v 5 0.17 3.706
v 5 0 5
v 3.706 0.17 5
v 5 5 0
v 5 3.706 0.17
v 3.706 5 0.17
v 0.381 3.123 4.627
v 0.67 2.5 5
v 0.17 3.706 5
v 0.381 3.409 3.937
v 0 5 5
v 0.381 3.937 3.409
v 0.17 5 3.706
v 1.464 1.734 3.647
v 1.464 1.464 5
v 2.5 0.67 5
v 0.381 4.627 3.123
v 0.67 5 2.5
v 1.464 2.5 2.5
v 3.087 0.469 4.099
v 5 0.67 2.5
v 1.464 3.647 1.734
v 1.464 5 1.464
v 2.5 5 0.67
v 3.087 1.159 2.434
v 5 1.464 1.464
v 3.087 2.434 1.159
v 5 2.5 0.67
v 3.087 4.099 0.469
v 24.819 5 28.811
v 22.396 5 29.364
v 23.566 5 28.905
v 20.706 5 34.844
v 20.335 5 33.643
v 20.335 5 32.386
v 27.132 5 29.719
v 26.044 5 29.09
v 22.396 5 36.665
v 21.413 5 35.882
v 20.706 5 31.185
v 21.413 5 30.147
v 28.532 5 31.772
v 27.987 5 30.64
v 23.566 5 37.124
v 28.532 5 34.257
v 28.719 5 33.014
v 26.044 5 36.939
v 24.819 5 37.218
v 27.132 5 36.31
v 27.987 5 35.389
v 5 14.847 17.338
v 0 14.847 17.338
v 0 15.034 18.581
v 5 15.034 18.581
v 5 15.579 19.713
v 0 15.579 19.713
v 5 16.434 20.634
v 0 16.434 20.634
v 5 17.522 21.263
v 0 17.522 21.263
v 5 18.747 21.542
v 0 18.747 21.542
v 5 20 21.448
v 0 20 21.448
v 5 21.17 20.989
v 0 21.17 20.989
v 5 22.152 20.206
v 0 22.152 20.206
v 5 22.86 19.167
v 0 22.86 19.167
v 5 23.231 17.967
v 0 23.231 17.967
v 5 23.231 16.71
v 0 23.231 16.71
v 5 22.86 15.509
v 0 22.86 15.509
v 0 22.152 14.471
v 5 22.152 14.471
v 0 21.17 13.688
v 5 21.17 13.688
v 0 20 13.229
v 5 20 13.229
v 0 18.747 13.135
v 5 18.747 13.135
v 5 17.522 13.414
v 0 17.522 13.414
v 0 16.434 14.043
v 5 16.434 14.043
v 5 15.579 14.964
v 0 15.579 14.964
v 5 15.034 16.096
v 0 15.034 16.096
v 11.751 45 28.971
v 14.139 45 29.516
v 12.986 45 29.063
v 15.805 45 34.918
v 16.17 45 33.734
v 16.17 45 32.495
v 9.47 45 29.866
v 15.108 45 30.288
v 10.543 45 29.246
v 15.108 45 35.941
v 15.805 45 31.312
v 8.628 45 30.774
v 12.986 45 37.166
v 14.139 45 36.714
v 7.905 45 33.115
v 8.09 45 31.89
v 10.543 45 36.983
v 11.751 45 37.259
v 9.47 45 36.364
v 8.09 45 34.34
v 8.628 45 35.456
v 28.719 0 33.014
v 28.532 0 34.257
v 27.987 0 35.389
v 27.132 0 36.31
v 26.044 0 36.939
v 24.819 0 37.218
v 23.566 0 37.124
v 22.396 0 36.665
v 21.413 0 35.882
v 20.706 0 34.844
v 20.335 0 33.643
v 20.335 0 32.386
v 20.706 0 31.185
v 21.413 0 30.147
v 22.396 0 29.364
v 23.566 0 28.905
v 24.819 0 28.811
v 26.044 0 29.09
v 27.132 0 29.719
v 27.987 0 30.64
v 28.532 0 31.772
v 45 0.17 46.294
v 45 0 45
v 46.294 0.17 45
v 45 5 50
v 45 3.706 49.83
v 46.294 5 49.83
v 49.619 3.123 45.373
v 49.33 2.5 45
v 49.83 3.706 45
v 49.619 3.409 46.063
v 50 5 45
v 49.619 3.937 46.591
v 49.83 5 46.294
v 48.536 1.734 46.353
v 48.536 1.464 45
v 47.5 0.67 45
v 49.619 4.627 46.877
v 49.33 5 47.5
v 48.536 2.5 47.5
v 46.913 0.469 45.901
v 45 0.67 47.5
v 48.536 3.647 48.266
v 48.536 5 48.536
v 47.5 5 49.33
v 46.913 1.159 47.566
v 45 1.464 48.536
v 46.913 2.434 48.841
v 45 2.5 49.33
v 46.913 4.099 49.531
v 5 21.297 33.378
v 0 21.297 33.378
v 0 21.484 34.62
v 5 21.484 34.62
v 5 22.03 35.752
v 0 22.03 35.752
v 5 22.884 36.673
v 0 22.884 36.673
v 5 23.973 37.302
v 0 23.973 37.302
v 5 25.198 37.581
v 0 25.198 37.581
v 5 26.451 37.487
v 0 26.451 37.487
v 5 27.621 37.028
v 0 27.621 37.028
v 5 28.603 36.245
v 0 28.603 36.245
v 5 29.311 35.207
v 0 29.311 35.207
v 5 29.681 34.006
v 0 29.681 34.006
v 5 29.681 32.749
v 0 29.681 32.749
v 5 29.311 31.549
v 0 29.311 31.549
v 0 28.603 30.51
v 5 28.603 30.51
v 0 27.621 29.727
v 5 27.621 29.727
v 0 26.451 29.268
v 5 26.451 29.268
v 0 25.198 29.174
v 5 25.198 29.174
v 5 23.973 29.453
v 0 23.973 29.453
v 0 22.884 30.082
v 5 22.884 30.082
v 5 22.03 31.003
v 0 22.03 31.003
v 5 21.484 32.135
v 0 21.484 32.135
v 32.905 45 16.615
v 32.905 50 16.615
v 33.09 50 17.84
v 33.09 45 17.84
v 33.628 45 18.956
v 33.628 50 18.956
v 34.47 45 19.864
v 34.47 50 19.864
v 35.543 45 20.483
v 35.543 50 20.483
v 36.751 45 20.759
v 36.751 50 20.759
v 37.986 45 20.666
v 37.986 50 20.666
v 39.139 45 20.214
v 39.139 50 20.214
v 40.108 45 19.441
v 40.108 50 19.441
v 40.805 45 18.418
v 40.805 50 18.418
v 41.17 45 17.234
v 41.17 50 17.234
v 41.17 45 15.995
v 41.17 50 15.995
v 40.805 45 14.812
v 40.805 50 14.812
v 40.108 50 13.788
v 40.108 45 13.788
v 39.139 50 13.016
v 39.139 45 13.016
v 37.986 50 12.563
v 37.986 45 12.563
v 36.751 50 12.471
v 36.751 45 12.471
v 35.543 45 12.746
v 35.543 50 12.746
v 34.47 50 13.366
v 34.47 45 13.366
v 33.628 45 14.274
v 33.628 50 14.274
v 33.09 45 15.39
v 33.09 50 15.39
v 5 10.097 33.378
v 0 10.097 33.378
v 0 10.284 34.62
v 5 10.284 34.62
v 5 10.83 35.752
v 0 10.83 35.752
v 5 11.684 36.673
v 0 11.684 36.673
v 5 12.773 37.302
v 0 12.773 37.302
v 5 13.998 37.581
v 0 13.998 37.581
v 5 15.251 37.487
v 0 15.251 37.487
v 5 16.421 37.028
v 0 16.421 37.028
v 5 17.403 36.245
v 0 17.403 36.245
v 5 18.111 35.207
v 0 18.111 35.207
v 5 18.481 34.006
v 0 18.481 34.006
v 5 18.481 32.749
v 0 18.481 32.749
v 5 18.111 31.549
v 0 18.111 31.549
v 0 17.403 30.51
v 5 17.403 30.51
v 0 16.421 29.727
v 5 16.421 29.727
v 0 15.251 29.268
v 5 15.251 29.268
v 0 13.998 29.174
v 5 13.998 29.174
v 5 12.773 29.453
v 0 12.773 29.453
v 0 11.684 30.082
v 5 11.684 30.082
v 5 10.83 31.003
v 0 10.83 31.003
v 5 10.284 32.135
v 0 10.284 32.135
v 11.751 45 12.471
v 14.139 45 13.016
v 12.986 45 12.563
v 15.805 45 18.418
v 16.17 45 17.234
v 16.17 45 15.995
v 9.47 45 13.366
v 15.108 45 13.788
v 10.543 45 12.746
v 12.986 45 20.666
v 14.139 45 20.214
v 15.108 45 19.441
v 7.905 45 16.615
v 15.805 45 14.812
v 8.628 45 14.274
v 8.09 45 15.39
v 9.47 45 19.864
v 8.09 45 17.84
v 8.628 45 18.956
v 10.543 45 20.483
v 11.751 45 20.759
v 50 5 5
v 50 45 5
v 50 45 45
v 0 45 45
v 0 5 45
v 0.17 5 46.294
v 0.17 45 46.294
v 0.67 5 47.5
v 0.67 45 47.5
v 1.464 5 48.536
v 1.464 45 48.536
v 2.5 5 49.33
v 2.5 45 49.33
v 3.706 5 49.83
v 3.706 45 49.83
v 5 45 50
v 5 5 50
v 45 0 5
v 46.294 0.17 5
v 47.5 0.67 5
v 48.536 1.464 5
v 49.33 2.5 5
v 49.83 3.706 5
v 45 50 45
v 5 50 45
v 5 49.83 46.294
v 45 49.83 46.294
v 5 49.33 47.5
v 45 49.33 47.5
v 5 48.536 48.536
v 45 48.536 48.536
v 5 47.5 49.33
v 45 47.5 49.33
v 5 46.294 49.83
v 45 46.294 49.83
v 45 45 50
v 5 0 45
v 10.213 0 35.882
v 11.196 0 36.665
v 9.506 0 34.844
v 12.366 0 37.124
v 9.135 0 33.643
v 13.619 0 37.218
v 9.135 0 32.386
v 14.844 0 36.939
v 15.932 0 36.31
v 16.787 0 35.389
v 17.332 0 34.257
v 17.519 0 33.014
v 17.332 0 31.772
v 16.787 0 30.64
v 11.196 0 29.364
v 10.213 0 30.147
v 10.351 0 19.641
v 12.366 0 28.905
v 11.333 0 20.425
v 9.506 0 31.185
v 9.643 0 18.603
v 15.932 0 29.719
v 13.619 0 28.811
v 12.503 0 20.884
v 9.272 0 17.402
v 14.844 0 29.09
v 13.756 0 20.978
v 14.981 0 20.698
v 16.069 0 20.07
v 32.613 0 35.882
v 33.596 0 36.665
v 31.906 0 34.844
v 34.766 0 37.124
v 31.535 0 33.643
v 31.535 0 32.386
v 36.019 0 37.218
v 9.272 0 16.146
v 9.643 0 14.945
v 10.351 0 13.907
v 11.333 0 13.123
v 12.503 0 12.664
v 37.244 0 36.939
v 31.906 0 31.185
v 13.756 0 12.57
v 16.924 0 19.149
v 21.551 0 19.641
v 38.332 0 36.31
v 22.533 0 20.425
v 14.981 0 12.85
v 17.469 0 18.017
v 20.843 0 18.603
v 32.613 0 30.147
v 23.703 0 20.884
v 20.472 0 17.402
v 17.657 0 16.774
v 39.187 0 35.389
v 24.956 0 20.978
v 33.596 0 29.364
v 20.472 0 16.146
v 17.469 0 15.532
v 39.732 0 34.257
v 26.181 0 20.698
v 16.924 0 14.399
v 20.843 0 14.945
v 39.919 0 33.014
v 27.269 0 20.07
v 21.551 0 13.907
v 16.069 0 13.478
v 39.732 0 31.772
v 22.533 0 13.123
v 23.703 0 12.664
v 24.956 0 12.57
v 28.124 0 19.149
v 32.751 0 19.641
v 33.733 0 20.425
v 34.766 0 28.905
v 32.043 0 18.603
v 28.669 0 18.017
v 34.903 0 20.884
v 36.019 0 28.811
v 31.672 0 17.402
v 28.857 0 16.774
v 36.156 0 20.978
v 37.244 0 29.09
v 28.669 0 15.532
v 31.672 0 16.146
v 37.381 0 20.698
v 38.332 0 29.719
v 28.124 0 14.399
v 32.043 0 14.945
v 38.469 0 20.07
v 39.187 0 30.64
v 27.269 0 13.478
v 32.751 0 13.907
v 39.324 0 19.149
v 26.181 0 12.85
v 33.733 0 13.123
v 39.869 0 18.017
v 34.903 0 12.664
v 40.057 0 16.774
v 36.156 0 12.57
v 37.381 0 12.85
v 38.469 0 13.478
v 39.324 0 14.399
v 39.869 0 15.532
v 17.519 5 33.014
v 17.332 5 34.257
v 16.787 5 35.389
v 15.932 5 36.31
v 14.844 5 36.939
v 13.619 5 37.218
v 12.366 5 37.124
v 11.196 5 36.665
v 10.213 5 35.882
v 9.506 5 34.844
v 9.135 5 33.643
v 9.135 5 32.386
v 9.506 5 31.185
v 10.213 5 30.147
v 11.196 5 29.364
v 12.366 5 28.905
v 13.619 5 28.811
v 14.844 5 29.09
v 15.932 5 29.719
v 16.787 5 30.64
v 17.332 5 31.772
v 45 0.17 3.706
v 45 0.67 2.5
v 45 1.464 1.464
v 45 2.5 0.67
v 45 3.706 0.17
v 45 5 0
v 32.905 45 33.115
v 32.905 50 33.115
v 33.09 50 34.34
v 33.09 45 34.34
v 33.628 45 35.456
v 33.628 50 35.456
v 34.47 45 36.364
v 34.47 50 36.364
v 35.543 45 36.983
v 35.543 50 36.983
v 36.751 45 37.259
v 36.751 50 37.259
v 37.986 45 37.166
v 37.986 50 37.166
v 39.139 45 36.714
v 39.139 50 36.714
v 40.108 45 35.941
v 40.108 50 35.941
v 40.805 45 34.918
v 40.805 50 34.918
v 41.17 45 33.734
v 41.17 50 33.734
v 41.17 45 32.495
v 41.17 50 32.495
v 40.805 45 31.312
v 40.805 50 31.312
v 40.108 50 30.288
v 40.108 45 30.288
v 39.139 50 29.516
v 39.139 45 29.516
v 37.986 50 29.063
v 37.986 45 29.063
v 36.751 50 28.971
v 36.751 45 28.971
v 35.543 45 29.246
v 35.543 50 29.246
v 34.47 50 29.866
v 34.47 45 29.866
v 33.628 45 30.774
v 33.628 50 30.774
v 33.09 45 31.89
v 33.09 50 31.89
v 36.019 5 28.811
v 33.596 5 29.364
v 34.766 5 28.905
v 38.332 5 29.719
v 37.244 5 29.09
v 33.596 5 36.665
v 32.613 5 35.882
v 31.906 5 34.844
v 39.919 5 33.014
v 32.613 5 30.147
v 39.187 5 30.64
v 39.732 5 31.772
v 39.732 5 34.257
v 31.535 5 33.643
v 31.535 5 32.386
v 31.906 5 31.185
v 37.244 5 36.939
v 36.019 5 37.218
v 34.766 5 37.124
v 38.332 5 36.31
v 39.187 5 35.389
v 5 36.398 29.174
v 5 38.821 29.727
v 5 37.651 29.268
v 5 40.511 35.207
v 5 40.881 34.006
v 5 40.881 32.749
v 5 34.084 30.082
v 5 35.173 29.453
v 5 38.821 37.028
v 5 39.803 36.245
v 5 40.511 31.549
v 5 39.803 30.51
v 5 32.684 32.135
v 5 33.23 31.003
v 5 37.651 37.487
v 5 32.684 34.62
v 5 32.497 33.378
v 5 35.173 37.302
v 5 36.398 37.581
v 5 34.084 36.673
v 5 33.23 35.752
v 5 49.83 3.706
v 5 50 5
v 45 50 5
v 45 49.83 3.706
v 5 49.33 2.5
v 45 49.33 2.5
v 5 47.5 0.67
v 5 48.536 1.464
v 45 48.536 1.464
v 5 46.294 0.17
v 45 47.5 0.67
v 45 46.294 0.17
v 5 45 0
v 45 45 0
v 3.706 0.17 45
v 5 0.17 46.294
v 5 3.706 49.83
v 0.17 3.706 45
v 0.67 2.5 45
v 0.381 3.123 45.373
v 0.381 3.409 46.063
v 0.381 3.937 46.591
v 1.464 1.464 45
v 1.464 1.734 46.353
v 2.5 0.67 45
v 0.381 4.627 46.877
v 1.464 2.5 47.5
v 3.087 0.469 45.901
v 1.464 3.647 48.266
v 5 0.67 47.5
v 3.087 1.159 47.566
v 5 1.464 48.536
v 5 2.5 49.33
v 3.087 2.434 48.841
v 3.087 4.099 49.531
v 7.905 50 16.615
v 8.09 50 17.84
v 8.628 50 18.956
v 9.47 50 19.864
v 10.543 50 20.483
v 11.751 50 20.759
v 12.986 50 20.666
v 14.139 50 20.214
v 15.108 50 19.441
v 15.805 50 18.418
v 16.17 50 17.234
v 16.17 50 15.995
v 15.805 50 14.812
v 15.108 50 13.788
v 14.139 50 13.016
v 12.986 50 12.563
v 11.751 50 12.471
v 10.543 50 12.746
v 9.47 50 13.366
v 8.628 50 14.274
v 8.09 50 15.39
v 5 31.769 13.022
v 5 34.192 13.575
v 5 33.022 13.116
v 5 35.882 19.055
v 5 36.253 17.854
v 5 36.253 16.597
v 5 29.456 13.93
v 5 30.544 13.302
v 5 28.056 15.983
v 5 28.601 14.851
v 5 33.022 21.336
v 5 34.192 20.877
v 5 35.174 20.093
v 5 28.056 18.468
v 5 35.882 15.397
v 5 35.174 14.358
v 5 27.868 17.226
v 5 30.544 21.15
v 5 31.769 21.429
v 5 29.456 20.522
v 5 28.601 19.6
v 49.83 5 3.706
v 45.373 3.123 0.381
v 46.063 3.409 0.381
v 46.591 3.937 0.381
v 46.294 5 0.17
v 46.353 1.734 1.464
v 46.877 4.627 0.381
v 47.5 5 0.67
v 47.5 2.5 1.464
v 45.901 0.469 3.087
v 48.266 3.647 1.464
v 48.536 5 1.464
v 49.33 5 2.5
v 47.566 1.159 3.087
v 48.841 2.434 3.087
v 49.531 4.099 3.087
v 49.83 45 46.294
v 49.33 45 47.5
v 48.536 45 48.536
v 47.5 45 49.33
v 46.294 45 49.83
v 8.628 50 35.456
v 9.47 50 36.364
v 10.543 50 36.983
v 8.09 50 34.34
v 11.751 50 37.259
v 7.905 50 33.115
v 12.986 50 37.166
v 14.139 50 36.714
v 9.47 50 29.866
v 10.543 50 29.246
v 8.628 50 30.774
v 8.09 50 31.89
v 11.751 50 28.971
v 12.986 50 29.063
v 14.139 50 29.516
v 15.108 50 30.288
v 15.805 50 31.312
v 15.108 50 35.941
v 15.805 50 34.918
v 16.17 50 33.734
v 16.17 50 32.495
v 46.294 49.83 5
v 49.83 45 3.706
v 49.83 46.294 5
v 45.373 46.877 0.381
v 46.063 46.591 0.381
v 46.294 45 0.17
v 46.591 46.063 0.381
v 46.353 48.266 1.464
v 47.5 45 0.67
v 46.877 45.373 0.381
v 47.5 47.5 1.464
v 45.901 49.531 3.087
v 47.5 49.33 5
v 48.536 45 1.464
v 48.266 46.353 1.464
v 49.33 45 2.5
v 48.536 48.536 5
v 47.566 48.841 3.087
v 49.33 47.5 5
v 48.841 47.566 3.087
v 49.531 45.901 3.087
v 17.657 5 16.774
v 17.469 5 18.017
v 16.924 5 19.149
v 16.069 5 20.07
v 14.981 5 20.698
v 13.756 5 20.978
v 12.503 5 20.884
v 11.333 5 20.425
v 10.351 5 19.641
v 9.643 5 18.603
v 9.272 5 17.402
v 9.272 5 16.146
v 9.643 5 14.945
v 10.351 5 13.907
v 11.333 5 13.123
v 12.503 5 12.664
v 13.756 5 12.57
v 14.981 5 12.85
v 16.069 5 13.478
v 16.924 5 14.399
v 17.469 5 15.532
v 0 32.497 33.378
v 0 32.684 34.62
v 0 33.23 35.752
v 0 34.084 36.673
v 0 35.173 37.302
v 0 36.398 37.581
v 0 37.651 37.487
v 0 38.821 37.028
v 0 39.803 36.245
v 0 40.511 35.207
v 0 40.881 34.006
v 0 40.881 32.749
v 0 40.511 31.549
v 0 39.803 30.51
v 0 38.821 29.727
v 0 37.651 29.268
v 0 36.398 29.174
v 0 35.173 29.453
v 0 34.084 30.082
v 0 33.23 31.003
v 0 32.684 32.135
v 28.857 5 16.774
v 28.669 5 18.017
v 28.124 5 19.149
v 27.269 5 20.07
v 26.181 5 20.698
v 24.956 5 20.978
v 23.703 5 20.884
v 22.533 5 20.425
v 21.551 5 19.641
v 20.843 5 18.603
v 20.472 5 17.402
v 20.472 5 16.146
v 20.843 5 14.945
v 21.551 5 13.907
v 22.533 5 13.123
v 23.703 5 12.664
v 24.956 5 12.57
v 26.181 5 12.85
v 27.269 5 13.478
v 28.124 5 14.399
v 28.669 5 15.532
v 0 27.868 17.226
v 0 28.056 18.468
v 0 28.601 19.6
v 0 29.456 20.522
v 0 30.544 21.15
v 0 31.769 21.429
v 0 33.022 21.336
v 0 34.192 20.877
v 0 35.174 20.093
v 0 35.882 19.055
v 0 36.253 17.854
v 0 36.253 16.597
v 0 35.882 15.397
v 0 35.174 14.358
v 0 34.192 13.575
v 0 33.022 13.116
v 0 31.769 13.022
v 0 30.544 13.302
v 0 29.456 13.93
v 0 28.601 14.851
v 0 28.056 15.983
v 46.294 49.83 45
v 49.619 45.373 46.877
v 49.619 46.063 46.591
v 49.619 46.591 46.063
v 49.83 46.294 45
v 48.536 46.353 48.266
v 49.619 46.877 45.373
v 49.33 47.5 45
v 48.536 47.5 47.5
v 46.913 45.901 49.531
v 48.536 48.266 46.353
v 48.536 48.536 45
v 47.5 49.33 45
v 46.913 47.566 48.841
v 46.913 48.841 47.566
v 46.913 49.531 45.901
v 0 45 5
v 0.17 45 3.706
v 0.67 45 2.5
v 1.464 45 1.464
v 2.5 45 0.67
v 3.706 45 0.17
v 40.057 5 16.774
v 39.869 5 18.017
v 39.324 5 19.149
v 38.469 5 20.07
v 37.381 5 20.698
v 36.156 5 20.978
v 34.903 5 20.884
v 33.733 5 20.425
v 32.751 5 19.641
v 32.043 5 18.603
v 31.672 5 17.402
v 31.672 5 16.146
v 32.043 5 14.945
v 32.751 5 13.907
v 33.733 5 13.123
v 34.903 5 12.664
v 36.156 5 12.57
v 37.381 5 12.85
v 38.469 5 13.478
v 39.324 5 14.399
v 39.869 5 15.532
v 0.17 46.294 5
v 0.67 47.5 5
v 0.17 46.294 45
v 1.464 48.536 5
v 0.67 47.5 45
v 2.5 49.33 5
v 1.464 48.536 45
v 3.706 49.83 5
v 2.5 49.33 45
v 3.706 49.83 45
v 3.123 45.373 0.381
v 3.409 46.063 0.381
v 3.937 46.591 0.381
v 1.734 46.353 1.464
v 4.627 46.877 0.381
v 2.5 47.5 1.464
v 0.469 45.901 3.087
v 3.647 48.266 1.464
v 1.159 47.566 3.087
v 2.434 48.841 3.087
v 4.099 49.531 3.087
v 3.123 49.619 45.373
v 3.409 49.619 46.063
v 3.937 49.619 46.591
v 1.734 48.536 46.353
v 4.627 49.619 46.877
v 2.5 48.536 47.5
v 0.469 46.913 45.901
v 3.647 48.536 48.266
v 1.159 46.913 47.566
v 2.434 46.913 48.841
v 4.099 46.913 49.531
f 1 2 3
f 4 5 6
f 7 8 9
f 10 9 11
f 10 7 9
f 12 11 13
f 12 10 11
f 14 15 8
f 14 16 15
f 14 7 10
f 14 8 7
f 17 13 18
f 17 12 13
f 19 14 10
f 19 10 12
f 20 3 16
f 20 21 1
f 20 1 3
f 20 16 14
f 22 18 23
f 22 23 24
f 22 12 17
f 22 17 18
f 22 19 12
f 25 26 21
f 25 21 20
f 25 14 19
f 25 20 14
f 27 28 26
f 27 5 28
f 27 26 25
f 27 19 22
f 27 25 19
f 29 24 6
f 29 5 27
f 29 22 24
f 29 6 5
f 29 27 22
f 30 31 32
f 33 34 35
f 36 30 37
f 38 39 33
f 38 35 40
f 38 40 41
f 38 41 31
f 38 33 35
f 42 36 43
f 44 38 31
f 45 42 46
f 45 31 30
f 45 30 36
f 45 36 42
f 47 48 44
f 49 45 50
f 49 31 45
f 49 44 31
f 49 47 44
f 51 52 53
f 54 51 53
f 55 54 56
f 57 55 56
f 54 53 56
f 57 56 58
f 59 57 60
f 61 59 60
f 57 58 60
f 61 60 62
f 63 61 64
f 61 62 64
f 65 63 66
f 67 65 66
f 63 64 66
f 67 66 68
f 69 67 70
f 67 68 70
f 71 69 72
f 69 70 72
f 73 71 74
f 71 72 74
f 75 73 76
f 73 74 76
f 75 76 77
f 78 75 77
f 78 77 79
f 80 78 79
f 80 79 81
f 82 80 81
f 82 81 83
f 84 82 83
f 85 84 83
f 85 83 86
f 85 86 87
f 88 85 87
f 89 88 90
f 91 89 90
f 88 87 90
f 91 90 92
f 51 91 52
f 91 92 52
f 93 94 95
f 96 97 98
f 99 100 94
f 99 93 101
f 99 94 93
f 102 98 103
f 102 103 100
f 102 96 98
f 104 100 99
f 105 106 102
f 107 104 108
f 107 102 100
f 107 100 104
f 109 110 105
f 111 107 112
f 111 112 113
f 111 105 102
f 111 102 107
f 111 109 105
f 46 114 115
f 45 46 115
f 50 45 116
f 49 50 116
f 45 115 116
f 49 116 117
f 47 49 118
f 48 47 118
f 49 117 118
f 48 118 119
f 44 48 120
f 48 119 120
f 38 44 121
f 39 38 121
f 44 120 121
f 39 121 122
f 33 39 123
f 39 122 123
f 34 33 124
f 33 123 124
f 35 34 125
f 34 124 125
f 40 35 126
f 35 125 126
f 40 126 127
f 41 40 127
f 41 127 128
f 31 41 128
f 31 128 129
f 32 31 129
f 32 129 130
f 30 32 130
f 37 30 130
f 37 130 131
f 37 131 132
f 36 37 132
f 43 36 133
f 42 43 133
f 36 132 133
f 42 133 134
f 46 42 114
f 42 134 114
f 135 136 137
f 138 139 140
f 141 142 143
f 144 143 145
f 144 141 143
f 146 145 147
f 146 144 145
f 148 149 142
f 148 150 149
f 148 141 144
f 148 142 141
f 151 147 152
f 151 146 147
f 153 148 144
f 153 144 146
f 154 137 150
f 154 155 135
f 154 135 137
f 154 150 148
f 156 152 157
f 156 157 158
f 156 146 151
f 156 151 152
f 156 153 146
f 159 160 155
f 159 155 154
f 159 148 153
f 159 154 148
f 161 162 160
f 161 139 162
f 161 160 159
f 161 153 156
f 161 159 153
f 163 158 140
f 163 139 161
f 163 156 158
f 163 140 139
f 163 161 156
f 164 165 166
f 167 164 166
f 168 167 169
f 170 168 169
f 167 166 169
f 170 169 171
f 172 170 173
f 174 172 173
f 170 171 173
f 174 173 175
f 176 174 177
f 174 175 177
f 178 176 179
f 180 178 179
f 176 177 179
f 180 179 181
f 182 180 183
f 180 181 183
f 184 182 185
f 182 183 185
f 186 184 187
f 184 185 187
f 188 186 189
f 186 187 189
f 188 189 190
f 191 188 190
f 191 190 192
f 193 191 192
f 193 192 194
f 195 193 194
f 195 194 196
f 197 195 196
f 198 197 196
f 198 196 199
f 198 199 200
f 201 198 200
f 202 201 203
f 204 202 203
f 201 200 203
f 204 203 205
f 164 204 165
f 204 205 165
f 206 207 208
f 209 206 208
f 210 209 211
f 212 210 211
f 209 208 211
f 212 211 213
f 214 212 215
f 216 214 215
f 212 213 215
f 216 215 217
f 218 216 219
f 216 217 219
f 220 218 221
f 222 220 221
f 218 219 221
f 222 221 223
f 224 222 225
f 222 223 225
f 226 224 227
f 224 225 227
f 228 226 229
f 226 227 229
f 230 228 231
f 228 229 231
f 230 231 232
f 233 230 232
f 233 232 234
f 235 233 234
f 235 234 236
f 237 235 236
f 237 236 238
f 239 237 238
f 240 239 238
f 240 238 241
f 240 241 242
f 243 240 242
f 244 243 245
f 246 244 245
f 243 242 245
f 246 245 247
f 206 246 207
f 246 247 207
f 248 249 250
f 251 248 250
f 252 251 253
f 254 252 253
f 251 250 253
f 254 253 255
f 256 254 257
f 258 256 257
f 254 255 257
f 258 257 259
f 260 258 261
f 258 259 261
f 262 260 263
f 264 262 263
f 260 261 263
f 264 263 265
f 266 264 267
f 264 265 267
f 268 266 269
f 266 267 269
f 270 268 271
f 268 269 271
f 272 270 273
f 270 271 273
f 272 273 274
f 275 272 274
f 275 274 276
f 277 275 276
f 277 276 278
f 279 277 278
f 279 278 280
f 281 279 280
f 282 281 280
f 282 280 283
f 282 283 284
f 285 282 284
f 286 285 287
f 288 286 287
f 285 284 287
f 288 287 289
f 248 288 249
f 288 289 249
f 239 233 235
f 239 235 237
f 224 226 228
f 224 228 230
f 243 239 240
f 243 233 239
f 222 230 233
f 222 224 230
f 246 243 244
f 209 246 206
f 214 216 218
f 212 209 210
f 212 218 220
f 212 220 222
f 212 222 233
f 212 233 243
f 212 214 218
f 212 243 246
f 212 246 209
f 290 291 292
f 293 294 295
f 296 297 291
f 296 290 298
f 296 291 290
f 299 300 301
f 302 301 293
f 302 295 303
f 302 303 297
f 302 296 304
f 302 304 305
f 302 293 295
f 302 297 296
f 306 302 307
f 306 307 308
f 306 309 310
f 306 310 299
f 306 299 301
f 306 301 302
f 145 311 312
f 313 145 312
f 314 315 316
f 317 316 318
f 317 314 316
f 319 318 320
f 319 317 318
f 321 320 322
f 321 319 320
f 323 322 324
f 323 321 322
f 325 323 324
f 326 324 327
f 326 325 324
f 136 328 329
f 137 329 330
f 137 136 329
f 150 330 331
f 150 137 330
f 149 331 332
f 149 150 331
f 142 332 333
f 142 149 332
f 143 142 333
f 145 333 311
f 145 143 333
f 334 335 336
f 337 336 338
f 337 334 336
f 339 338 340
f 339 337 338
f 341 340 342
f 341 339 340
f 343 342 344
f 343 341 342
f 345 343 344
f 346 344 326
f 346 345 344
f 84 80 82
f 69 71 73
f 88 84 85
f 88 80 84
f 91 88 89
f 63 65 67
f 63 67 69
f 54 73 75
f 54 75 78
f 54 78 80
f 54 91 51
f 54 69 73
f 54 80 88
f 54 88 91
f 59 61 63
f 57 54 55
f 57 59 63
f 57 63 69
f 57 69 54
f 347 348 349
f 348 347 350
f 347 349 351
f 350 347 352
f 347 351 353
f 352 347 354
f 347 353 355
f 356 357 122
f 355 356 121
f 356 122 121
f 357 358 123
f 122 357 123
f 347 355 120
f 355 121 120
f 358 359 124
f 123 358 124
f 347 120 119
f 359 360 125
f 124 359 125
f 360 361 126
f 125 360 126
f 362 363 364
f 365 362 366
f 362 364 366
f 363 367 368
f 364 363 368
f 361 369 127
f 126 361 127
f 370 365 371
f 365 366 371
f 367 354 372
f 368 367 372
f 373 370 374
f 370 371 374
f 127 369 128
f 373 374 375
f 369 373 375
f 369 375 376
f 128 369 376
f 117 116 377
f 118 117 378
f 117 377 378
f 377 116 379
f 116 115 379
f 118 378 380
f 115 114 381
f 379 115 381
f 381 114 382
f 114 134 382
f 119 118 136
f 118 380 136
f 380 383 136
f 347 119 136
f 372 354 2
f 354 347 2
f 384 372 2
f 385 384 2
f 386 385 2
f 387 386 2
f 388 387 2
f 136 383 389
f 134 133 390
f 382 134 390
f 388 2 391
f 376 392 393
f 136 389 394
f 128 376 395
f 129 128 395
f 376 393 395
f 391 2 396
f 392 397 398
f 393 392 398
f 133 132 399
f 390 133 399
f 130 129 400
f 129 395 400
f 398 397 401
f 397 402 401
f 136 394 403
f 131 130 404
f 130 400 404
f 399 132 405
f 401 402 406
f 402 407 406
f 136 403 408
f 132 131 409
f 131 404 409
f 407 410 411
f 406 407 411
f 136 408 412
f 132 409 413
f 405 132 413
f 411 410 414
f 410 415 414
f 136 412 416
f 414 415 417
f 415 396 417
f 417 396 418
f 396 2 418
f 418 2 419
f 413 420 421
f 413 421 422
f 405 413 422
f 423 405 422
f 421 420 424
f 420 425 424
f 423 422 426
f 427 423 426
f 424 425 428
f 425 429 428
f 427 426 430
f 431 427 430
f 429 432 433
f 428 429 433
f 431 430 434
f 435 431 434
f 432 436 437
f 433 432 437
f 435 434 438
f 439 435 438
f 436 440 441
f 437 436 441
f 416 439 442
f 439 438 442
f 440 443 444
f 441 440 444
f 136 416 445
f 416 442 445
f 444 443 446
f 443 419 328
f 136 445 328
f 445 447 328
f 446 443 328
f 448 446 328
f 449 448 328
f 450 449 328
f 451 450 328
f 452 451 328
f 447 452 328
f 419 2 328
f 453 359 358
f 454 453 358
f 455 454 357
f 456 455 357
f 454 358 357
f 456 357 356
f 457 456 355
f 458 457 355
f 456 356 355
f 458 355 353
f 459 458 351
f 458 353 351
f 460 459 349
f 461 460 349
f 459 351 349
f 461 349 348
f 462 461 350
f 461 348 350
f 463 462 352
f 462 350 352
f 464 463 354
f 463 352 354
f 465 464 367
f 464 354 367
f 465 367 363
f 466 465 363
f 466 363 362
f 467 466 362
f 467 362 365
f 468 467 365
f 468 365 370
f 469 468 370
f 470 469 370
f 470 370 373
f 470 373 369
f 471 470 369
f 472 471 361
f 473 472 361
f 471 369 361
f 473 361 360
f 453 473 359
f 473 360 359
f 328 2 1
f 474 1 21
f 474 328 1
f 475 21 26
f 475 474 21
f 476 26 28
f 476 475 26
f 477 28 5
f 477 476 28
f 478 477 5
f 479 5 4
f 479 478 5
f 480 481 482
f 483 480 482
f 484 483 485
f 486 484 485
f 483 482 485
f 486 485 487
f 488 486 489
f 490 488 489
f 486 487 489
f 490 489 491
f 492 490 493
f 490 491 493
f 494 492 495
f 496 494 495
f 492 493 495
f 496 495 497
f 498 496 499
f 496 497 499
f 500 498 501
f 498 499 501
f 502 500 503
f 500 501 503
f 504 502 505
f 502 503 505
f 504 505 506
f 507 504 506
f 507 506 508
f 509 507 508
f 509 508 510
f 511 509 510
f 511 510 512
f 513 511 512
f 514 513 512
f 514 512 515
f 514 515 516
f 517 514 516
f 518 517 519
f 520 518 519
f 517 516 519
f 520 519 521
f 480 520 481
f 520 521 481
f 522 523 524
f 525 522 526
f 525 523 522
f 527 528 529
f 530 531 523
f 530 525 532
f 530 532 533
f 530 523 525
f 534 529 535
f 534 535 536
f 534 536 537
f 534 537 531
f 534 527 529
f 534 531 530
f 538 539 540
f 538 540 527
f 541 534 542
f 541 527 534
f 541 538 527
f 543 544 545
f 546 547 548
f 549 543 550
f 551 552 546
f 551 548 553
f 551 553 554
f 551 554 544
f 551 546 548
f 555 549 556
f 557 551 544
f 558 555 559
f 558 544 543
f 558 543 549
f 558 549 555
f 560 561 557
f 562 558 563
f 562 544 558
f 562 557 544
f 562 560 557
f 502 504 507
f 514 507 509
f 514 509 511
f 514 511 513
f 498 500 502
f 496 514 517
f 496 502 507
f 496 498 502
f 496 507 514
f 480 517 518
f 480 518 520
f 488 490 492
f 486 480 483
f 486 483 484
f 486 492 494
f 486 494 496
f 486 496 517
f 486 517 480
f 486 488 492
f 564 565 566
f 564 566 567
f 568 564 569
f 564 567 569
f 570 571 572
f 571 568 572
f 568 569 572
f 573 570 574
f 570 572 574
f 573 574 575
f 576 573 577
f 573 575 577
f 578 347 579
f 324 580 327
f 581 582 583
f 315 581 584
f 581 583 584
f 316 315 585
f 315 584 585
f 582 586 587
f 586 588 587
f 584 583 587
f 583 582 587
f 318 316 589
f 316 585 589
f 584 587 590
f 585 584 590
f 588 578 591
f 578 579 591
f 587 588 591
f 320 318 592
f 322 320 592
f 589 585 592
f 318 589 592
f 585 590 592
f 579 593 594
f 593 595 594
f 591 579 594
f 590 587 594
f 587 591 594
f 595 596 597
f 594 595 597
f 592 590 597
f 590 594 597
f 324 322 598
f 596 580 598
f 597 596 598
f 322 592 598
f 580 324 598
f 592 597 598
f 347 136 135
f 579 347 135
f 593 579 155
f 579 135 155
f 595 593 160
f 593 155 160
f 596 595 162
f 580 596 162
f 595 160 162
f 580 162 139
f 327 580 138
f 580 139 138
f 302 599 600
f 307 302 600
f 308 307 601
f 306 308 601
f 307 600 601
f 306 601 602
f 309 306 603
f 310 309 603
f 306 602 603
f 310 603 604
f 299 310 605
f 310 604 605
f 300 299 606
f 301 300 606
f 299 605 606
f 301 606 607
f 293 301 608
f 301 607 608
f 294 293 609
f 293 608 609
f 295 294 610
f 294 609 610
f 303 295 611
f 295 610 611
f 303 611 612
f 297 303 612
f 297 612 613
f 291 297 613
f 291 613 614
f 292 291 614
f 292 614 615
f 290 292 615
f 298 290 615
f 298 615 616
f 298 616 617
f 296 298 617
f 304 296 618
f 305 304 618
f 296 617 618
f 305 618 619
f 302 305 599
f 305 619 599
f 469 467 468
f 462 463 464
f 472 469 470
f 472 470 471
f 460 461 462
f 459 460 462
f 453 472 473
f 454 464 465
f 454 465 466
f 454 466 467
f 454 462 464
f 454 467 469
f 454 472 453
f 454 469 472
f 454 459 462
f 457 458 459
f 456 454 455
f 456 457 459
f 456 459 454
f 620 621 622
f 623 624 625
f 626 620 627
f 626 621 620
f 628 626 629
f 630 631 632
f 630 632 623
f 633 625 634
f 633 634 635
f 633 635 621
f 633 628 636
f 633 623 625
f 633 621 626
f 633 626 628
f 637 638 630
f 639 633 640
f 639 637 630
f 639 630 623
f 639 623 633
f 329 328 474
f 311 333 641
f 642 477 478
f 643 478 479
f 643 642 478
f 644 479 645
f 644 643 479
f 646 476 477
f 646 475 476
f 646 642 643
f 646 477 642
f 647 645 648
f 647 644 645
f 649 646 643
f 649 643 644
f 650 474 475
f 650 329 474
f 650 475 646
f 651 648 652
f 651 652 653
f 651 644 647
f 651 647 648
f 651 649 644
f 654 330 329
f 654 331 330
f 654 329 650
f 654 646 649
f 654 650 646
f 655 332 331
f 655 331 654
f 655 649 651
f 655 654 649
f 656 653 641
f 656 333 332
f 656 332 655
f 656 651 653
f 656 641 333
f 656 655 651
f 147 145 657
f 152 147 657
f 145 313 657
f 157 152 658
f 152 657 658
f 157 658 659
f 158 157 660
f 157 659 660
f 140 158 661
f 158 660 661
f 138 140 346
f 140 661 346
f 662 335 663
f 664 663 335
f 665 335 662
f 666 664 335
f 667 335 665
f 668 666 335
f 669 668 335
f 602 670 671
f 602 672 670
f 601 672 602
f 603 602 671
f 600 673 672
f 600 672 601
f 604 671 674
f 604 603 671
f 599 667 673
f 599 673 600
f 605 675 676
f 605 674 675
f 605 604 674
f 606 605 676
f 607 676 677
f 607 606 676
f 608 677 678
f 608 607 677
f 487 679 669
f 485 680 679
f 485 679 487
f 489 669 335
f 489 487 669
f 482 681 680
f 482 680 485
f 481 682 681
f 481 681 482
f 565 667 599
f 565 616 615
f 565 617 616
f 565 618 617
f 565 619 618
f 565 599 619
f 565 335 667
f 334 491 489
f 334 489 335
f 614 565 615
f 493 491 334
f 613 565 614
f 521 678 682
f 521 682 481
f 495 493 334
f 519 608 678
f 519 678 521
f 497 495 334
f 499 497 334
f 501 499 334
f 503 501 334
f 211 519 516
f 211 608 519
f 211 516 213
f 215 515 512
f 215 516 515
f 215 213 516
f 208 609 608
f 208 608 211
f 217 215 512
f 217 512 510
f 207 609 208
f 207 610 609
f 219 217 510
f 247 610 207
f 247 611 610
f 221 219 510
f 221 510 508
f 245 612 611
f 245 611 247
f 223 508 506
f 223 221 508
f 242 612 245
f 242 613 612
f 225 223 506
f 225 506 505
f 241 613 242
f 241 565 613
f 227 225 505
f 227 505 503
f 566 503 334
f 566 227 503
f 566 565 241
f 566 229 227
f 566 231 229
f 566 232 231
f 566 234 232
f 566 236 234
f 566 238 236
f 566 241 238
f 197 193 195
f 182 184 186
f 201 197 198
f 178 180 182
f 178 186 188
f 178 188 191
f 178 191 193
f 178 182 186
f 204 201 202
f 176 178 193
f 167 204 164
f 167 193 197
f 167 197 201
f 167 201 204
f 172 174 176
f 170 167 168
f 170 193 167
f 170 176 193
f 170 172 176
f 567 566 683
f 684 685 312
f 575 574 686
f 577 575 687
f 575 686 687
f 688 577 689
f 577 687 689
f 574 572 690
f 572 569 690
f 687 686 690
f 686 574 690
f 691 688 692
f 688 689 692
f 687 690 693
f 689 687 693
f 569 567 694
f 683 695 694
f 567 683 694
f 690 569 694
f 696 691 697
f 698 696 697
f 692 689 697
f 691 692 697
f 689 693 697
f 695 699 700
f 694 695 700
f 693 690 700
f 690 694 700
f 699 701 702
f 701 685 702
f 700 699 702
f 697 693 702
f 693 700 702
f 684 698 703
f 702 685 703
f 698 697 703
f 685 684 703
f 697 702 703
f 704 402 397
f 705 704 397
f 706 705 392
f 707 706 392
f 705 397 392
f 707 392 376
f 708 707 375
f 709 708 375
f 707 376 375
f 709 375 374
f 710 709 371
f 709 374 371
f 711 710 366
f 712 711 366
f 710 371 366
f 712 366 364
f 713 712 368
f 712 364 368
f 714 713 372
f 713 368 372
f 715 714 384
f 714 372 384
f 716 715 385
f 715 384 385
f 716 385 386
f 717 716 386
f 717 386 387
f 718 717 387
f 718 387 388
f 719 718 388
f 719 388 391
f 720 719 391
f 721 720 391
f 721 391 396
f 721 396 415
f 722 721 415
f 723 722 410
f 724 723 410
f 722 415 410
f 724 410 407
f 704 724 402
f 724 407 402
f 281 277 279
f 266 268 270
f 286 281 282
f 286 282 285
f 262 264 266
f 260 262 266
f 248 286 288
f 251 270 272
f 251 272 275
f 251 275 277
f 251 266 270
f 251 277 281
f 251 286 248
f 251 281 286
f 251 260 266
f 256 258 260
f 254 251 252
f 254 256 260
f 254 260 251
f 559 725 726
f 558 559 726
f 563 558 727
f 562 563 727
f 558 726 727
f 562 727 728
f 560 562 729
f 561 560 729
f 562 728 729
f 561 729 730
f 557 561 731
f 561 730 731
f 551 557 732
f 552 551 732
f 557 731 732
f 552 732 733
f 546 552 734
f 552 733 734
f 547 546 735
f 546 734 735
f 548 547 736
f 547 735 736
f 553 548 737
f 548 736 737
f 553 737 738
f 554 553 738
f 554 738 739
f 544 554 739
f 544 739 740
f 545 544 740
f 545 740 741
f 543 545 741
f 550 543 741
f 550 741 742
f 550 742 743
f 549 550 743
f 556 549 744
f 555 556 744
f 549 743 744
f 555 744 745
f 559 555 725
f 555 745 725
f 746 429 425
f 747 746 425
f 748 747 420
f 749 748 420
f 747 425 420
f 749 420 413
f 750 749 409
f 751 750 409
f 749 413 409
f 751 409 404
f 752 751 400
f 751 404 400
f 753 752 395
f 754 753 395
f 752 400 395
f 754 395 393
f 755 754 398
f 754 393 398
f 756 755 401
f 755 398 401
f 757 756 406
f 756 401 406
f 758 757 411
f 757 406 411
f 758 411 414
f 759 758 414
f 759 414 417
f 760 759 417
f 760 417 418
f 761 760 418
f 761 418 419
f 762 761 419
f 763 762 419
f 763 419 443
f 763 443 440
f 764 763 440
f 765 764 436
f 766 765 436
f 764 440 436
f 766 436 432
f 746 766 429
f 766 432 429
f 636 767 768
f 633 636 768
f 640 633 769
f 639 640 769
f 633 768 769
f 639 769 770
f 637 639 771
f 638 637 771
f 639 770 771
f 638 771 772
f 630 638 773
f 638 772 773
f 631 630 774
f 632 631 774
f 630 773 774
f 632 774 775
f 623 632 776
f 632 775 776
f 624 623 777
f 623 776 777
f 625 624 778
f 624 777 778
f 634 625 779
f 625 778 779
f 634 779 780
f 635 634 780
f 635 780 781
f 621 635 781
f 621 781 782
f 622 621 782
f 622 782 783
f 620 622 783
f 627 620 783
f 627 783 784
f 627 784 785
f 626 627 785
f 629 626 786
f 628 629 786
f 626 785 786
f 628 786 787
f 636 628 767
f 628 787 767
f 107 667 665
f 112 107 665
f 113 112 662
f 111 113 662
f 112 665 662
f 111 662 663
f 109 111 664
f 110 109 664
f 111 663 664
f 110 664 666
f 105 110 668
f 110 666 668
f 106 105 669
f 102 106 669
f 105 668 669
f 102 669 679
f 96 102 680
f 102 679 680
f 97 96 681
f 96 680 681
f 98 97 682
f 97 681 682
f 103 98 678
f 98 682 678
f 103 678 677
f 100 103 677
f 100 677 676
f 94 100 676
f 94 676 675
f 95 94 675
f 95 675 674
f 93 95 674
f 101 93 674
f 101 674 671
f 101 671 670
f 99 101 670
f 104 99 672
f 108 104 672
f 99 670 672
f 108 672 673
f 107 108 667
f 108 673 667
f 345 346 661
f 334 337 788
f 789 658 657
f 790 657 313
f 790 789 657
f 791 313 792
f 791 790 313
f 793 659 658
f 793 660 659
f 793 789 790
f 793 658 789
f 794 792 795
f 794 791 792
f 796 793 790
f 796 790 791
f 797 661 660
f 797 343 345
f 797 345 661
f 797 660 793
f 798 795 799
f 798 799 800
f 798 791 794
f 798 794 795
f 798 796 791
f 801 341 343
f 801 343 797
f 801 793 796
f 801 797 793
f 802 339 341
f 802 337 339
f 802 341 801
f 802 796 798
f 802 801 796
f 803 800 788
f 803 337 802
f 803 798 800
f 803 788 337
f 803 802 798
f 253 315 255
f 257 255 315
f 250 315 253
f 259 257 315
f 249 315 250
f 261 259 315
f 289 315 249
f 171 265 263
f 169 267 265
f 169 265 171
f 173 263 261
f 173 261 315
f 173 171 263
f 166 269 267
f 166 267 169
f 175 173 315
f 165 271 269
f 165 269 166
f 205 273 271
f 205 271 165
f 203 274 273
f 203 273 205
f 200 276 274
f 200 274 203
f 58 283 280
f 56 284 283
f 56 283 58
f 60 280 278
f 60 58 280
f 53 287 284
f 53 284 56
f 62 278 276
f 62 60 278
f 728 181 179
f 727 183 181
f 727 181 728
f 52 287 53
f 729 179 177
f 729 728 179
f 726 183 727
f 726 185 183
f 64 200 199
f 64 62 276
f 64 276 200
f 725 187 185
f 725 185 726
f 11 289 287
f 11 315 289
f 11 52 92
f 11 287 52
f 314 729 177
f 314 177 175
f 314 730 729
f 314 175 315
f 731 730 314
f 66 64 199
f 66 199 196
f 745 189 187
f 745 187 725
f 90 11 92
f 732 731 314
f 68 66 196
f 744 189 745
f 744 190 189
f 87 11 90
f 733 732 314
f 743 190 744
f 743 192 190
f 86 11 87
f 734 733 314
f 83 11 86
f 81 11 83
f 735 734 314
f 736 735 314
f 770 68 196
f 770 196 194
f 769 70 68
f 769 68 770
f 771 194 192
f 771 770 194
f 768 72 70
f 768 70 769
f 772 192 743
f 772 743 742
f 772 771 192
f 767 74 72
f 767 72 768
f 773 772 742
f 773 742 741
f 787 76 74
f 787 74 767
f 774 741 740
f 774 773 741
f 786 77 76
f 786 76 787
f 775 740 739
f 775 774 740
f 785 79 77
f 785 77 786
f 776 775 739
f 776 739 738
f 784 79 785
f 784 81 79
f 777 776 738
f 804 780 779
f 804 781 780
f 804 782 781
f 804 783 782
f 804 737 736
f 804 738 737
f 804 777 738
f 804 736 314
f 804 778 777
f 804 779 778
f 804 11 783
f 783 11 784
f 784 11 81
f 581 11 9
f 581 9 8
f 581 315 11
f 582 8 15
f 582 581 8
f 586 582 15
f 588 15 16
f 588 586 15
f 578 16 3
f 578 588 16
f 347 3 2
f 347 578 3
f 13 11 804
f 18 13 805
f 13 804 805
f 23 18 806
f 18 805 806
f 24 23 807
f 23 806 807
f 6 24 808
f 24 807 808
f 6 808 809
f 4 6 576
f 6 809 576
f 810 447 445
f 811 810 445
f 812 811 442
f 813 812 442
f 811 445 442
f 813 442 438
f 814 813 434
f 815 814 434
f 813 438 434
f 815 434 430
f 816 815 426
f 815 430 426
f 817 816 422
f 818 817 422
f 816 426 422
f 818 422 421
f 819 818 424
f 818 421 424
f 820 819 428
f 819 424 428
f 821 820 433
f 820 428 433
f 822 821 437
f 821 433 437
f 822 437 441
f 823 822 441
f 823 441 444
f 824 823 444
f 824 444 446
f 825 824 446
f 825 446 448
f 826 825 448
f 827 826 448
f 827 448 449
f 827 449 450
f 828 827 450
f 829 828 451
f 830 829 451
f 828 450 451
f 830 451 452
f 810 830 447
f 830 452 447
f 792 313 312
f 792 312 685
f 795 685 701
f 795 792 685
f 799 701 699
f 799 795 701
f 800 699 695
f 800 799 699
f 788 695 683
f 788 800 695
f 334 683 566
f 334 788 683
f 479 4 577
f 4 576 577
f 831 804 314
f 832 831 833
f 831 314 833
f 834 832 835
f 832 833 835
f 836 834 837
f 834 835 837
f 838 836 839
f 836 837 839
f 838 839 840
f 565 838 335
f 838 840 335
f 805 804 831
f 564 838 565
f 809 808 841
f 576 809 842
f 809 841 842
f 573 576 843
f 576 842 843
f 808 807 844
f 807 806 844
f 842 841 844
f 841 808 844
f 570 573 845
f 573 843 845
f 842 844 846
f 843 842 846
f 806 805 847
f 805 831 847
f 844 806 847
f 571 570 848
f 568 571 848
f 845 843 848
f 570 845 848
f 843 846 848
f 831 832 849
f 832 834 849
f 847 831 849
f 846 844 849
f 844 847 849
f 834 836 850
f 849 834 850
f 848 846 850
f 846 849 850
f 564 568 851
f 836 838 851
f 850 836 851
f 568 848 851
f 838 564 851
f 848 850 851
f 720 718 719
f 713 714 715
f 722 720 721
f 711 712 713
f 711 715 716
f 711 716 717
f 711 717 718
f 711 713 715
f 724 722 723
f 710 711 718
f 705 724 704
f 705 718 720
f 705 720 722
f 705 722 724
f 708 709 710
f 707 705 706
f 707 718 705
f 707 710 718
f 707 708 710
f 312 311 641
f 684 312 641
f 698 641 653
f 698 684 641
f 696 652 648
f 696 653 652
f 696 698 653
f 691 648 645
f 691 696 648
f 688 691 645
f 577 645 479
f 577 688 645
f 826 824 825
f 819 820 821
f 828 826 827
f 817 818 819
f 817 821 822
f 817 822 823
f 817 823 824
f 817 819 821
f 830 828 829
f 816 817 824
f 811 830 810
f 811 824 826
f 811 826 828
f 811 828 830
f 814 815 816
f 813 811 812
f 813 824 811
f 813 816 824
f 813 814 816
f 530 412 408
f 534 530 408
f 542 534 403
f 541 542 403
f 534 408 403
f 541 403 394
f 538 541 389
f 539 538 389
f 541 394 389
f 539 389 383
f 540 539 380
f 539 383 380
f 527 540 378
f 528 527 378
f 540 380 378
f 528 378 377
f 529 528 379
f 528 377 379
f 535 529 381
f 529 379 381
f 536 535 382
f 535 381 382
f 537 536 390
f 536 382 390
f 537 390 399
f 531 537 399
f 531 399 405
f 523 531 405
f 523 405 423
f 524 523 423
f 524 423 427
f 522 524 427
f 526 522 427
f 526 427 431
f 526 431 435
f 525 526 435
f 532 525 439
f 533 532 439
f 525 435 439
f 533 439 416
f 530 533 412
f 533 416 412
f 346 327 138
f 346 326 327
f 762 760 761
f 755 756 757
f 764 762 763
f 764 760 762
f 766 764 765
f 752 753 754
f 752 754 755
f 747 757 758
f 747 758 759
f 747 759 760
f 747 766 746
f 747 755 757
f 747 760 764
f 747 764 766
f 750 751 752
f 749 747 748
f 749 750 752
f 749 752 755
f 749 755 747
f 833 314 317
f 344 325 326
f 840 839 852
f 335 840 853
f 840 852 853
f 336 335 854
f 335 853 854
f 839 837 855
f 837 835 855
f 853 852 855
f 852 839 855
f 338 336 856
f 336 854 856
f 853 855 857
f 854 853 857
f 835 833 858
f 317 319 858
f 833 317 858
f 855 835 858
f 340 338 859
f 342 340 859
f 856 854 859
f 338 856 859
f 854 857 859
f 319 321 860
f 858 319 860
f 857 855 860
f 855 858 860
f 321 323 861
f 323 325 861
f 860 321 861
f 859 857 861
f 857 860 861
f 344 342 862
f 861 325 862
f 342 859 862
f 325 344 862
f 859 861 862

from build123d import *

# Parameters (mm, degrees)
F0_W     = 50
F0_H     = 50
F1_DEPTH = 50
F2_R     = 5
F3_R     = 4.215568
F4_DEPTH = 5
F5_R     = 4.215568
F6_DEPTH = 5
F7_R     = 4.1557
F8_DEPTH = 5


with BuildPart() as f1:
    # F0 (on Top) → F1 (new body)
    with BuildSketch(Plane.XY):
        with Locations((25, 25)):
            Rectangle(F0_W, F0_H)
    extrude(amount=F1_DEPTH)

    # F2
    f2_edges = [f1.edges().sort_by_distance(p)[0] for p in [
        (25, 0, 50),
        (50, 0, 25),
        (25, 0, 0),
        (0, 0, 25),
        (0, 25, 50),
        (0, 50, 25),
        (0, 25, 0),
        (25, 50, 50),
        (50, 25, 50),
        (50, 50, 25),
        (25, 50, 0),
        (50, 25, 0),
    ]]
    fillet(f2_edges, radius=F2_R)

    # F3 (on face) → F4 (cut)
    with BuildSketch(Plane.XZ):
        with Locations((13.303663, 33.014465)):
            Circle(F3_R)
        with Locations((24.503663, 33.014465)):
            Circle(F3_R)
        with Locations((35.703663, 33.014465)):
            Circle(F3_R)
        with Locations((13.440982, 16.774133)):
            Circle(F3_R)
        with Locations((24.640982, 16.774133)):
            Circle(F3_R)
        with Locations((35.840982, 16.774133)):
            Circle(F3_R)
    extrude(amount=-F4_DEPTH, mode=Mode.SUBTRACT)

    # F5 (on face) → F6 (cut)
    with BuildSketch(Plane(origin=(0, 0, 0), x_dir=(0, -1, 0), z_dir=(-1, 0, 0))):
        with Locations((-36.712744, 33.377577)):
            Circle(F5_R)
        with Locations((-25.512744, 33.377577)):
            Circle(F5_R)
        with Locations((-14.312744, 33.377577)):
            Circle(F5_R)
        with Locations((-32.08404, 17.225714)):
            Circle(F5_R)
        with Locations((-19.062114, 17.338414)):
            Circle(F5_R)
    extrude(amount=-F6_DEPTH, mode=Mode.SUBTRACT)

    # F7 (on face) → F8 (cut)
    with BuildSketch(Plane(origin=(0, 50, 0), x_dir=(-1, 0, 0), z_dir=(0, 1, 0))):
        with Locations((-12.061181, 16.614642)):
            Circle(F7_R)
        with Locations((-37.061181, 16.614642)):
            Circle(F7_R)
        with Locations((-12.061181, 33.114642)):
            Circle(F7_R)
        with Locations((-37.061181, 33.114642)):
            Circle(F7_R)
    extrude(amount=-F8_DEPTH, mode=Mode.SUBTRACT)


solid = f1.part
